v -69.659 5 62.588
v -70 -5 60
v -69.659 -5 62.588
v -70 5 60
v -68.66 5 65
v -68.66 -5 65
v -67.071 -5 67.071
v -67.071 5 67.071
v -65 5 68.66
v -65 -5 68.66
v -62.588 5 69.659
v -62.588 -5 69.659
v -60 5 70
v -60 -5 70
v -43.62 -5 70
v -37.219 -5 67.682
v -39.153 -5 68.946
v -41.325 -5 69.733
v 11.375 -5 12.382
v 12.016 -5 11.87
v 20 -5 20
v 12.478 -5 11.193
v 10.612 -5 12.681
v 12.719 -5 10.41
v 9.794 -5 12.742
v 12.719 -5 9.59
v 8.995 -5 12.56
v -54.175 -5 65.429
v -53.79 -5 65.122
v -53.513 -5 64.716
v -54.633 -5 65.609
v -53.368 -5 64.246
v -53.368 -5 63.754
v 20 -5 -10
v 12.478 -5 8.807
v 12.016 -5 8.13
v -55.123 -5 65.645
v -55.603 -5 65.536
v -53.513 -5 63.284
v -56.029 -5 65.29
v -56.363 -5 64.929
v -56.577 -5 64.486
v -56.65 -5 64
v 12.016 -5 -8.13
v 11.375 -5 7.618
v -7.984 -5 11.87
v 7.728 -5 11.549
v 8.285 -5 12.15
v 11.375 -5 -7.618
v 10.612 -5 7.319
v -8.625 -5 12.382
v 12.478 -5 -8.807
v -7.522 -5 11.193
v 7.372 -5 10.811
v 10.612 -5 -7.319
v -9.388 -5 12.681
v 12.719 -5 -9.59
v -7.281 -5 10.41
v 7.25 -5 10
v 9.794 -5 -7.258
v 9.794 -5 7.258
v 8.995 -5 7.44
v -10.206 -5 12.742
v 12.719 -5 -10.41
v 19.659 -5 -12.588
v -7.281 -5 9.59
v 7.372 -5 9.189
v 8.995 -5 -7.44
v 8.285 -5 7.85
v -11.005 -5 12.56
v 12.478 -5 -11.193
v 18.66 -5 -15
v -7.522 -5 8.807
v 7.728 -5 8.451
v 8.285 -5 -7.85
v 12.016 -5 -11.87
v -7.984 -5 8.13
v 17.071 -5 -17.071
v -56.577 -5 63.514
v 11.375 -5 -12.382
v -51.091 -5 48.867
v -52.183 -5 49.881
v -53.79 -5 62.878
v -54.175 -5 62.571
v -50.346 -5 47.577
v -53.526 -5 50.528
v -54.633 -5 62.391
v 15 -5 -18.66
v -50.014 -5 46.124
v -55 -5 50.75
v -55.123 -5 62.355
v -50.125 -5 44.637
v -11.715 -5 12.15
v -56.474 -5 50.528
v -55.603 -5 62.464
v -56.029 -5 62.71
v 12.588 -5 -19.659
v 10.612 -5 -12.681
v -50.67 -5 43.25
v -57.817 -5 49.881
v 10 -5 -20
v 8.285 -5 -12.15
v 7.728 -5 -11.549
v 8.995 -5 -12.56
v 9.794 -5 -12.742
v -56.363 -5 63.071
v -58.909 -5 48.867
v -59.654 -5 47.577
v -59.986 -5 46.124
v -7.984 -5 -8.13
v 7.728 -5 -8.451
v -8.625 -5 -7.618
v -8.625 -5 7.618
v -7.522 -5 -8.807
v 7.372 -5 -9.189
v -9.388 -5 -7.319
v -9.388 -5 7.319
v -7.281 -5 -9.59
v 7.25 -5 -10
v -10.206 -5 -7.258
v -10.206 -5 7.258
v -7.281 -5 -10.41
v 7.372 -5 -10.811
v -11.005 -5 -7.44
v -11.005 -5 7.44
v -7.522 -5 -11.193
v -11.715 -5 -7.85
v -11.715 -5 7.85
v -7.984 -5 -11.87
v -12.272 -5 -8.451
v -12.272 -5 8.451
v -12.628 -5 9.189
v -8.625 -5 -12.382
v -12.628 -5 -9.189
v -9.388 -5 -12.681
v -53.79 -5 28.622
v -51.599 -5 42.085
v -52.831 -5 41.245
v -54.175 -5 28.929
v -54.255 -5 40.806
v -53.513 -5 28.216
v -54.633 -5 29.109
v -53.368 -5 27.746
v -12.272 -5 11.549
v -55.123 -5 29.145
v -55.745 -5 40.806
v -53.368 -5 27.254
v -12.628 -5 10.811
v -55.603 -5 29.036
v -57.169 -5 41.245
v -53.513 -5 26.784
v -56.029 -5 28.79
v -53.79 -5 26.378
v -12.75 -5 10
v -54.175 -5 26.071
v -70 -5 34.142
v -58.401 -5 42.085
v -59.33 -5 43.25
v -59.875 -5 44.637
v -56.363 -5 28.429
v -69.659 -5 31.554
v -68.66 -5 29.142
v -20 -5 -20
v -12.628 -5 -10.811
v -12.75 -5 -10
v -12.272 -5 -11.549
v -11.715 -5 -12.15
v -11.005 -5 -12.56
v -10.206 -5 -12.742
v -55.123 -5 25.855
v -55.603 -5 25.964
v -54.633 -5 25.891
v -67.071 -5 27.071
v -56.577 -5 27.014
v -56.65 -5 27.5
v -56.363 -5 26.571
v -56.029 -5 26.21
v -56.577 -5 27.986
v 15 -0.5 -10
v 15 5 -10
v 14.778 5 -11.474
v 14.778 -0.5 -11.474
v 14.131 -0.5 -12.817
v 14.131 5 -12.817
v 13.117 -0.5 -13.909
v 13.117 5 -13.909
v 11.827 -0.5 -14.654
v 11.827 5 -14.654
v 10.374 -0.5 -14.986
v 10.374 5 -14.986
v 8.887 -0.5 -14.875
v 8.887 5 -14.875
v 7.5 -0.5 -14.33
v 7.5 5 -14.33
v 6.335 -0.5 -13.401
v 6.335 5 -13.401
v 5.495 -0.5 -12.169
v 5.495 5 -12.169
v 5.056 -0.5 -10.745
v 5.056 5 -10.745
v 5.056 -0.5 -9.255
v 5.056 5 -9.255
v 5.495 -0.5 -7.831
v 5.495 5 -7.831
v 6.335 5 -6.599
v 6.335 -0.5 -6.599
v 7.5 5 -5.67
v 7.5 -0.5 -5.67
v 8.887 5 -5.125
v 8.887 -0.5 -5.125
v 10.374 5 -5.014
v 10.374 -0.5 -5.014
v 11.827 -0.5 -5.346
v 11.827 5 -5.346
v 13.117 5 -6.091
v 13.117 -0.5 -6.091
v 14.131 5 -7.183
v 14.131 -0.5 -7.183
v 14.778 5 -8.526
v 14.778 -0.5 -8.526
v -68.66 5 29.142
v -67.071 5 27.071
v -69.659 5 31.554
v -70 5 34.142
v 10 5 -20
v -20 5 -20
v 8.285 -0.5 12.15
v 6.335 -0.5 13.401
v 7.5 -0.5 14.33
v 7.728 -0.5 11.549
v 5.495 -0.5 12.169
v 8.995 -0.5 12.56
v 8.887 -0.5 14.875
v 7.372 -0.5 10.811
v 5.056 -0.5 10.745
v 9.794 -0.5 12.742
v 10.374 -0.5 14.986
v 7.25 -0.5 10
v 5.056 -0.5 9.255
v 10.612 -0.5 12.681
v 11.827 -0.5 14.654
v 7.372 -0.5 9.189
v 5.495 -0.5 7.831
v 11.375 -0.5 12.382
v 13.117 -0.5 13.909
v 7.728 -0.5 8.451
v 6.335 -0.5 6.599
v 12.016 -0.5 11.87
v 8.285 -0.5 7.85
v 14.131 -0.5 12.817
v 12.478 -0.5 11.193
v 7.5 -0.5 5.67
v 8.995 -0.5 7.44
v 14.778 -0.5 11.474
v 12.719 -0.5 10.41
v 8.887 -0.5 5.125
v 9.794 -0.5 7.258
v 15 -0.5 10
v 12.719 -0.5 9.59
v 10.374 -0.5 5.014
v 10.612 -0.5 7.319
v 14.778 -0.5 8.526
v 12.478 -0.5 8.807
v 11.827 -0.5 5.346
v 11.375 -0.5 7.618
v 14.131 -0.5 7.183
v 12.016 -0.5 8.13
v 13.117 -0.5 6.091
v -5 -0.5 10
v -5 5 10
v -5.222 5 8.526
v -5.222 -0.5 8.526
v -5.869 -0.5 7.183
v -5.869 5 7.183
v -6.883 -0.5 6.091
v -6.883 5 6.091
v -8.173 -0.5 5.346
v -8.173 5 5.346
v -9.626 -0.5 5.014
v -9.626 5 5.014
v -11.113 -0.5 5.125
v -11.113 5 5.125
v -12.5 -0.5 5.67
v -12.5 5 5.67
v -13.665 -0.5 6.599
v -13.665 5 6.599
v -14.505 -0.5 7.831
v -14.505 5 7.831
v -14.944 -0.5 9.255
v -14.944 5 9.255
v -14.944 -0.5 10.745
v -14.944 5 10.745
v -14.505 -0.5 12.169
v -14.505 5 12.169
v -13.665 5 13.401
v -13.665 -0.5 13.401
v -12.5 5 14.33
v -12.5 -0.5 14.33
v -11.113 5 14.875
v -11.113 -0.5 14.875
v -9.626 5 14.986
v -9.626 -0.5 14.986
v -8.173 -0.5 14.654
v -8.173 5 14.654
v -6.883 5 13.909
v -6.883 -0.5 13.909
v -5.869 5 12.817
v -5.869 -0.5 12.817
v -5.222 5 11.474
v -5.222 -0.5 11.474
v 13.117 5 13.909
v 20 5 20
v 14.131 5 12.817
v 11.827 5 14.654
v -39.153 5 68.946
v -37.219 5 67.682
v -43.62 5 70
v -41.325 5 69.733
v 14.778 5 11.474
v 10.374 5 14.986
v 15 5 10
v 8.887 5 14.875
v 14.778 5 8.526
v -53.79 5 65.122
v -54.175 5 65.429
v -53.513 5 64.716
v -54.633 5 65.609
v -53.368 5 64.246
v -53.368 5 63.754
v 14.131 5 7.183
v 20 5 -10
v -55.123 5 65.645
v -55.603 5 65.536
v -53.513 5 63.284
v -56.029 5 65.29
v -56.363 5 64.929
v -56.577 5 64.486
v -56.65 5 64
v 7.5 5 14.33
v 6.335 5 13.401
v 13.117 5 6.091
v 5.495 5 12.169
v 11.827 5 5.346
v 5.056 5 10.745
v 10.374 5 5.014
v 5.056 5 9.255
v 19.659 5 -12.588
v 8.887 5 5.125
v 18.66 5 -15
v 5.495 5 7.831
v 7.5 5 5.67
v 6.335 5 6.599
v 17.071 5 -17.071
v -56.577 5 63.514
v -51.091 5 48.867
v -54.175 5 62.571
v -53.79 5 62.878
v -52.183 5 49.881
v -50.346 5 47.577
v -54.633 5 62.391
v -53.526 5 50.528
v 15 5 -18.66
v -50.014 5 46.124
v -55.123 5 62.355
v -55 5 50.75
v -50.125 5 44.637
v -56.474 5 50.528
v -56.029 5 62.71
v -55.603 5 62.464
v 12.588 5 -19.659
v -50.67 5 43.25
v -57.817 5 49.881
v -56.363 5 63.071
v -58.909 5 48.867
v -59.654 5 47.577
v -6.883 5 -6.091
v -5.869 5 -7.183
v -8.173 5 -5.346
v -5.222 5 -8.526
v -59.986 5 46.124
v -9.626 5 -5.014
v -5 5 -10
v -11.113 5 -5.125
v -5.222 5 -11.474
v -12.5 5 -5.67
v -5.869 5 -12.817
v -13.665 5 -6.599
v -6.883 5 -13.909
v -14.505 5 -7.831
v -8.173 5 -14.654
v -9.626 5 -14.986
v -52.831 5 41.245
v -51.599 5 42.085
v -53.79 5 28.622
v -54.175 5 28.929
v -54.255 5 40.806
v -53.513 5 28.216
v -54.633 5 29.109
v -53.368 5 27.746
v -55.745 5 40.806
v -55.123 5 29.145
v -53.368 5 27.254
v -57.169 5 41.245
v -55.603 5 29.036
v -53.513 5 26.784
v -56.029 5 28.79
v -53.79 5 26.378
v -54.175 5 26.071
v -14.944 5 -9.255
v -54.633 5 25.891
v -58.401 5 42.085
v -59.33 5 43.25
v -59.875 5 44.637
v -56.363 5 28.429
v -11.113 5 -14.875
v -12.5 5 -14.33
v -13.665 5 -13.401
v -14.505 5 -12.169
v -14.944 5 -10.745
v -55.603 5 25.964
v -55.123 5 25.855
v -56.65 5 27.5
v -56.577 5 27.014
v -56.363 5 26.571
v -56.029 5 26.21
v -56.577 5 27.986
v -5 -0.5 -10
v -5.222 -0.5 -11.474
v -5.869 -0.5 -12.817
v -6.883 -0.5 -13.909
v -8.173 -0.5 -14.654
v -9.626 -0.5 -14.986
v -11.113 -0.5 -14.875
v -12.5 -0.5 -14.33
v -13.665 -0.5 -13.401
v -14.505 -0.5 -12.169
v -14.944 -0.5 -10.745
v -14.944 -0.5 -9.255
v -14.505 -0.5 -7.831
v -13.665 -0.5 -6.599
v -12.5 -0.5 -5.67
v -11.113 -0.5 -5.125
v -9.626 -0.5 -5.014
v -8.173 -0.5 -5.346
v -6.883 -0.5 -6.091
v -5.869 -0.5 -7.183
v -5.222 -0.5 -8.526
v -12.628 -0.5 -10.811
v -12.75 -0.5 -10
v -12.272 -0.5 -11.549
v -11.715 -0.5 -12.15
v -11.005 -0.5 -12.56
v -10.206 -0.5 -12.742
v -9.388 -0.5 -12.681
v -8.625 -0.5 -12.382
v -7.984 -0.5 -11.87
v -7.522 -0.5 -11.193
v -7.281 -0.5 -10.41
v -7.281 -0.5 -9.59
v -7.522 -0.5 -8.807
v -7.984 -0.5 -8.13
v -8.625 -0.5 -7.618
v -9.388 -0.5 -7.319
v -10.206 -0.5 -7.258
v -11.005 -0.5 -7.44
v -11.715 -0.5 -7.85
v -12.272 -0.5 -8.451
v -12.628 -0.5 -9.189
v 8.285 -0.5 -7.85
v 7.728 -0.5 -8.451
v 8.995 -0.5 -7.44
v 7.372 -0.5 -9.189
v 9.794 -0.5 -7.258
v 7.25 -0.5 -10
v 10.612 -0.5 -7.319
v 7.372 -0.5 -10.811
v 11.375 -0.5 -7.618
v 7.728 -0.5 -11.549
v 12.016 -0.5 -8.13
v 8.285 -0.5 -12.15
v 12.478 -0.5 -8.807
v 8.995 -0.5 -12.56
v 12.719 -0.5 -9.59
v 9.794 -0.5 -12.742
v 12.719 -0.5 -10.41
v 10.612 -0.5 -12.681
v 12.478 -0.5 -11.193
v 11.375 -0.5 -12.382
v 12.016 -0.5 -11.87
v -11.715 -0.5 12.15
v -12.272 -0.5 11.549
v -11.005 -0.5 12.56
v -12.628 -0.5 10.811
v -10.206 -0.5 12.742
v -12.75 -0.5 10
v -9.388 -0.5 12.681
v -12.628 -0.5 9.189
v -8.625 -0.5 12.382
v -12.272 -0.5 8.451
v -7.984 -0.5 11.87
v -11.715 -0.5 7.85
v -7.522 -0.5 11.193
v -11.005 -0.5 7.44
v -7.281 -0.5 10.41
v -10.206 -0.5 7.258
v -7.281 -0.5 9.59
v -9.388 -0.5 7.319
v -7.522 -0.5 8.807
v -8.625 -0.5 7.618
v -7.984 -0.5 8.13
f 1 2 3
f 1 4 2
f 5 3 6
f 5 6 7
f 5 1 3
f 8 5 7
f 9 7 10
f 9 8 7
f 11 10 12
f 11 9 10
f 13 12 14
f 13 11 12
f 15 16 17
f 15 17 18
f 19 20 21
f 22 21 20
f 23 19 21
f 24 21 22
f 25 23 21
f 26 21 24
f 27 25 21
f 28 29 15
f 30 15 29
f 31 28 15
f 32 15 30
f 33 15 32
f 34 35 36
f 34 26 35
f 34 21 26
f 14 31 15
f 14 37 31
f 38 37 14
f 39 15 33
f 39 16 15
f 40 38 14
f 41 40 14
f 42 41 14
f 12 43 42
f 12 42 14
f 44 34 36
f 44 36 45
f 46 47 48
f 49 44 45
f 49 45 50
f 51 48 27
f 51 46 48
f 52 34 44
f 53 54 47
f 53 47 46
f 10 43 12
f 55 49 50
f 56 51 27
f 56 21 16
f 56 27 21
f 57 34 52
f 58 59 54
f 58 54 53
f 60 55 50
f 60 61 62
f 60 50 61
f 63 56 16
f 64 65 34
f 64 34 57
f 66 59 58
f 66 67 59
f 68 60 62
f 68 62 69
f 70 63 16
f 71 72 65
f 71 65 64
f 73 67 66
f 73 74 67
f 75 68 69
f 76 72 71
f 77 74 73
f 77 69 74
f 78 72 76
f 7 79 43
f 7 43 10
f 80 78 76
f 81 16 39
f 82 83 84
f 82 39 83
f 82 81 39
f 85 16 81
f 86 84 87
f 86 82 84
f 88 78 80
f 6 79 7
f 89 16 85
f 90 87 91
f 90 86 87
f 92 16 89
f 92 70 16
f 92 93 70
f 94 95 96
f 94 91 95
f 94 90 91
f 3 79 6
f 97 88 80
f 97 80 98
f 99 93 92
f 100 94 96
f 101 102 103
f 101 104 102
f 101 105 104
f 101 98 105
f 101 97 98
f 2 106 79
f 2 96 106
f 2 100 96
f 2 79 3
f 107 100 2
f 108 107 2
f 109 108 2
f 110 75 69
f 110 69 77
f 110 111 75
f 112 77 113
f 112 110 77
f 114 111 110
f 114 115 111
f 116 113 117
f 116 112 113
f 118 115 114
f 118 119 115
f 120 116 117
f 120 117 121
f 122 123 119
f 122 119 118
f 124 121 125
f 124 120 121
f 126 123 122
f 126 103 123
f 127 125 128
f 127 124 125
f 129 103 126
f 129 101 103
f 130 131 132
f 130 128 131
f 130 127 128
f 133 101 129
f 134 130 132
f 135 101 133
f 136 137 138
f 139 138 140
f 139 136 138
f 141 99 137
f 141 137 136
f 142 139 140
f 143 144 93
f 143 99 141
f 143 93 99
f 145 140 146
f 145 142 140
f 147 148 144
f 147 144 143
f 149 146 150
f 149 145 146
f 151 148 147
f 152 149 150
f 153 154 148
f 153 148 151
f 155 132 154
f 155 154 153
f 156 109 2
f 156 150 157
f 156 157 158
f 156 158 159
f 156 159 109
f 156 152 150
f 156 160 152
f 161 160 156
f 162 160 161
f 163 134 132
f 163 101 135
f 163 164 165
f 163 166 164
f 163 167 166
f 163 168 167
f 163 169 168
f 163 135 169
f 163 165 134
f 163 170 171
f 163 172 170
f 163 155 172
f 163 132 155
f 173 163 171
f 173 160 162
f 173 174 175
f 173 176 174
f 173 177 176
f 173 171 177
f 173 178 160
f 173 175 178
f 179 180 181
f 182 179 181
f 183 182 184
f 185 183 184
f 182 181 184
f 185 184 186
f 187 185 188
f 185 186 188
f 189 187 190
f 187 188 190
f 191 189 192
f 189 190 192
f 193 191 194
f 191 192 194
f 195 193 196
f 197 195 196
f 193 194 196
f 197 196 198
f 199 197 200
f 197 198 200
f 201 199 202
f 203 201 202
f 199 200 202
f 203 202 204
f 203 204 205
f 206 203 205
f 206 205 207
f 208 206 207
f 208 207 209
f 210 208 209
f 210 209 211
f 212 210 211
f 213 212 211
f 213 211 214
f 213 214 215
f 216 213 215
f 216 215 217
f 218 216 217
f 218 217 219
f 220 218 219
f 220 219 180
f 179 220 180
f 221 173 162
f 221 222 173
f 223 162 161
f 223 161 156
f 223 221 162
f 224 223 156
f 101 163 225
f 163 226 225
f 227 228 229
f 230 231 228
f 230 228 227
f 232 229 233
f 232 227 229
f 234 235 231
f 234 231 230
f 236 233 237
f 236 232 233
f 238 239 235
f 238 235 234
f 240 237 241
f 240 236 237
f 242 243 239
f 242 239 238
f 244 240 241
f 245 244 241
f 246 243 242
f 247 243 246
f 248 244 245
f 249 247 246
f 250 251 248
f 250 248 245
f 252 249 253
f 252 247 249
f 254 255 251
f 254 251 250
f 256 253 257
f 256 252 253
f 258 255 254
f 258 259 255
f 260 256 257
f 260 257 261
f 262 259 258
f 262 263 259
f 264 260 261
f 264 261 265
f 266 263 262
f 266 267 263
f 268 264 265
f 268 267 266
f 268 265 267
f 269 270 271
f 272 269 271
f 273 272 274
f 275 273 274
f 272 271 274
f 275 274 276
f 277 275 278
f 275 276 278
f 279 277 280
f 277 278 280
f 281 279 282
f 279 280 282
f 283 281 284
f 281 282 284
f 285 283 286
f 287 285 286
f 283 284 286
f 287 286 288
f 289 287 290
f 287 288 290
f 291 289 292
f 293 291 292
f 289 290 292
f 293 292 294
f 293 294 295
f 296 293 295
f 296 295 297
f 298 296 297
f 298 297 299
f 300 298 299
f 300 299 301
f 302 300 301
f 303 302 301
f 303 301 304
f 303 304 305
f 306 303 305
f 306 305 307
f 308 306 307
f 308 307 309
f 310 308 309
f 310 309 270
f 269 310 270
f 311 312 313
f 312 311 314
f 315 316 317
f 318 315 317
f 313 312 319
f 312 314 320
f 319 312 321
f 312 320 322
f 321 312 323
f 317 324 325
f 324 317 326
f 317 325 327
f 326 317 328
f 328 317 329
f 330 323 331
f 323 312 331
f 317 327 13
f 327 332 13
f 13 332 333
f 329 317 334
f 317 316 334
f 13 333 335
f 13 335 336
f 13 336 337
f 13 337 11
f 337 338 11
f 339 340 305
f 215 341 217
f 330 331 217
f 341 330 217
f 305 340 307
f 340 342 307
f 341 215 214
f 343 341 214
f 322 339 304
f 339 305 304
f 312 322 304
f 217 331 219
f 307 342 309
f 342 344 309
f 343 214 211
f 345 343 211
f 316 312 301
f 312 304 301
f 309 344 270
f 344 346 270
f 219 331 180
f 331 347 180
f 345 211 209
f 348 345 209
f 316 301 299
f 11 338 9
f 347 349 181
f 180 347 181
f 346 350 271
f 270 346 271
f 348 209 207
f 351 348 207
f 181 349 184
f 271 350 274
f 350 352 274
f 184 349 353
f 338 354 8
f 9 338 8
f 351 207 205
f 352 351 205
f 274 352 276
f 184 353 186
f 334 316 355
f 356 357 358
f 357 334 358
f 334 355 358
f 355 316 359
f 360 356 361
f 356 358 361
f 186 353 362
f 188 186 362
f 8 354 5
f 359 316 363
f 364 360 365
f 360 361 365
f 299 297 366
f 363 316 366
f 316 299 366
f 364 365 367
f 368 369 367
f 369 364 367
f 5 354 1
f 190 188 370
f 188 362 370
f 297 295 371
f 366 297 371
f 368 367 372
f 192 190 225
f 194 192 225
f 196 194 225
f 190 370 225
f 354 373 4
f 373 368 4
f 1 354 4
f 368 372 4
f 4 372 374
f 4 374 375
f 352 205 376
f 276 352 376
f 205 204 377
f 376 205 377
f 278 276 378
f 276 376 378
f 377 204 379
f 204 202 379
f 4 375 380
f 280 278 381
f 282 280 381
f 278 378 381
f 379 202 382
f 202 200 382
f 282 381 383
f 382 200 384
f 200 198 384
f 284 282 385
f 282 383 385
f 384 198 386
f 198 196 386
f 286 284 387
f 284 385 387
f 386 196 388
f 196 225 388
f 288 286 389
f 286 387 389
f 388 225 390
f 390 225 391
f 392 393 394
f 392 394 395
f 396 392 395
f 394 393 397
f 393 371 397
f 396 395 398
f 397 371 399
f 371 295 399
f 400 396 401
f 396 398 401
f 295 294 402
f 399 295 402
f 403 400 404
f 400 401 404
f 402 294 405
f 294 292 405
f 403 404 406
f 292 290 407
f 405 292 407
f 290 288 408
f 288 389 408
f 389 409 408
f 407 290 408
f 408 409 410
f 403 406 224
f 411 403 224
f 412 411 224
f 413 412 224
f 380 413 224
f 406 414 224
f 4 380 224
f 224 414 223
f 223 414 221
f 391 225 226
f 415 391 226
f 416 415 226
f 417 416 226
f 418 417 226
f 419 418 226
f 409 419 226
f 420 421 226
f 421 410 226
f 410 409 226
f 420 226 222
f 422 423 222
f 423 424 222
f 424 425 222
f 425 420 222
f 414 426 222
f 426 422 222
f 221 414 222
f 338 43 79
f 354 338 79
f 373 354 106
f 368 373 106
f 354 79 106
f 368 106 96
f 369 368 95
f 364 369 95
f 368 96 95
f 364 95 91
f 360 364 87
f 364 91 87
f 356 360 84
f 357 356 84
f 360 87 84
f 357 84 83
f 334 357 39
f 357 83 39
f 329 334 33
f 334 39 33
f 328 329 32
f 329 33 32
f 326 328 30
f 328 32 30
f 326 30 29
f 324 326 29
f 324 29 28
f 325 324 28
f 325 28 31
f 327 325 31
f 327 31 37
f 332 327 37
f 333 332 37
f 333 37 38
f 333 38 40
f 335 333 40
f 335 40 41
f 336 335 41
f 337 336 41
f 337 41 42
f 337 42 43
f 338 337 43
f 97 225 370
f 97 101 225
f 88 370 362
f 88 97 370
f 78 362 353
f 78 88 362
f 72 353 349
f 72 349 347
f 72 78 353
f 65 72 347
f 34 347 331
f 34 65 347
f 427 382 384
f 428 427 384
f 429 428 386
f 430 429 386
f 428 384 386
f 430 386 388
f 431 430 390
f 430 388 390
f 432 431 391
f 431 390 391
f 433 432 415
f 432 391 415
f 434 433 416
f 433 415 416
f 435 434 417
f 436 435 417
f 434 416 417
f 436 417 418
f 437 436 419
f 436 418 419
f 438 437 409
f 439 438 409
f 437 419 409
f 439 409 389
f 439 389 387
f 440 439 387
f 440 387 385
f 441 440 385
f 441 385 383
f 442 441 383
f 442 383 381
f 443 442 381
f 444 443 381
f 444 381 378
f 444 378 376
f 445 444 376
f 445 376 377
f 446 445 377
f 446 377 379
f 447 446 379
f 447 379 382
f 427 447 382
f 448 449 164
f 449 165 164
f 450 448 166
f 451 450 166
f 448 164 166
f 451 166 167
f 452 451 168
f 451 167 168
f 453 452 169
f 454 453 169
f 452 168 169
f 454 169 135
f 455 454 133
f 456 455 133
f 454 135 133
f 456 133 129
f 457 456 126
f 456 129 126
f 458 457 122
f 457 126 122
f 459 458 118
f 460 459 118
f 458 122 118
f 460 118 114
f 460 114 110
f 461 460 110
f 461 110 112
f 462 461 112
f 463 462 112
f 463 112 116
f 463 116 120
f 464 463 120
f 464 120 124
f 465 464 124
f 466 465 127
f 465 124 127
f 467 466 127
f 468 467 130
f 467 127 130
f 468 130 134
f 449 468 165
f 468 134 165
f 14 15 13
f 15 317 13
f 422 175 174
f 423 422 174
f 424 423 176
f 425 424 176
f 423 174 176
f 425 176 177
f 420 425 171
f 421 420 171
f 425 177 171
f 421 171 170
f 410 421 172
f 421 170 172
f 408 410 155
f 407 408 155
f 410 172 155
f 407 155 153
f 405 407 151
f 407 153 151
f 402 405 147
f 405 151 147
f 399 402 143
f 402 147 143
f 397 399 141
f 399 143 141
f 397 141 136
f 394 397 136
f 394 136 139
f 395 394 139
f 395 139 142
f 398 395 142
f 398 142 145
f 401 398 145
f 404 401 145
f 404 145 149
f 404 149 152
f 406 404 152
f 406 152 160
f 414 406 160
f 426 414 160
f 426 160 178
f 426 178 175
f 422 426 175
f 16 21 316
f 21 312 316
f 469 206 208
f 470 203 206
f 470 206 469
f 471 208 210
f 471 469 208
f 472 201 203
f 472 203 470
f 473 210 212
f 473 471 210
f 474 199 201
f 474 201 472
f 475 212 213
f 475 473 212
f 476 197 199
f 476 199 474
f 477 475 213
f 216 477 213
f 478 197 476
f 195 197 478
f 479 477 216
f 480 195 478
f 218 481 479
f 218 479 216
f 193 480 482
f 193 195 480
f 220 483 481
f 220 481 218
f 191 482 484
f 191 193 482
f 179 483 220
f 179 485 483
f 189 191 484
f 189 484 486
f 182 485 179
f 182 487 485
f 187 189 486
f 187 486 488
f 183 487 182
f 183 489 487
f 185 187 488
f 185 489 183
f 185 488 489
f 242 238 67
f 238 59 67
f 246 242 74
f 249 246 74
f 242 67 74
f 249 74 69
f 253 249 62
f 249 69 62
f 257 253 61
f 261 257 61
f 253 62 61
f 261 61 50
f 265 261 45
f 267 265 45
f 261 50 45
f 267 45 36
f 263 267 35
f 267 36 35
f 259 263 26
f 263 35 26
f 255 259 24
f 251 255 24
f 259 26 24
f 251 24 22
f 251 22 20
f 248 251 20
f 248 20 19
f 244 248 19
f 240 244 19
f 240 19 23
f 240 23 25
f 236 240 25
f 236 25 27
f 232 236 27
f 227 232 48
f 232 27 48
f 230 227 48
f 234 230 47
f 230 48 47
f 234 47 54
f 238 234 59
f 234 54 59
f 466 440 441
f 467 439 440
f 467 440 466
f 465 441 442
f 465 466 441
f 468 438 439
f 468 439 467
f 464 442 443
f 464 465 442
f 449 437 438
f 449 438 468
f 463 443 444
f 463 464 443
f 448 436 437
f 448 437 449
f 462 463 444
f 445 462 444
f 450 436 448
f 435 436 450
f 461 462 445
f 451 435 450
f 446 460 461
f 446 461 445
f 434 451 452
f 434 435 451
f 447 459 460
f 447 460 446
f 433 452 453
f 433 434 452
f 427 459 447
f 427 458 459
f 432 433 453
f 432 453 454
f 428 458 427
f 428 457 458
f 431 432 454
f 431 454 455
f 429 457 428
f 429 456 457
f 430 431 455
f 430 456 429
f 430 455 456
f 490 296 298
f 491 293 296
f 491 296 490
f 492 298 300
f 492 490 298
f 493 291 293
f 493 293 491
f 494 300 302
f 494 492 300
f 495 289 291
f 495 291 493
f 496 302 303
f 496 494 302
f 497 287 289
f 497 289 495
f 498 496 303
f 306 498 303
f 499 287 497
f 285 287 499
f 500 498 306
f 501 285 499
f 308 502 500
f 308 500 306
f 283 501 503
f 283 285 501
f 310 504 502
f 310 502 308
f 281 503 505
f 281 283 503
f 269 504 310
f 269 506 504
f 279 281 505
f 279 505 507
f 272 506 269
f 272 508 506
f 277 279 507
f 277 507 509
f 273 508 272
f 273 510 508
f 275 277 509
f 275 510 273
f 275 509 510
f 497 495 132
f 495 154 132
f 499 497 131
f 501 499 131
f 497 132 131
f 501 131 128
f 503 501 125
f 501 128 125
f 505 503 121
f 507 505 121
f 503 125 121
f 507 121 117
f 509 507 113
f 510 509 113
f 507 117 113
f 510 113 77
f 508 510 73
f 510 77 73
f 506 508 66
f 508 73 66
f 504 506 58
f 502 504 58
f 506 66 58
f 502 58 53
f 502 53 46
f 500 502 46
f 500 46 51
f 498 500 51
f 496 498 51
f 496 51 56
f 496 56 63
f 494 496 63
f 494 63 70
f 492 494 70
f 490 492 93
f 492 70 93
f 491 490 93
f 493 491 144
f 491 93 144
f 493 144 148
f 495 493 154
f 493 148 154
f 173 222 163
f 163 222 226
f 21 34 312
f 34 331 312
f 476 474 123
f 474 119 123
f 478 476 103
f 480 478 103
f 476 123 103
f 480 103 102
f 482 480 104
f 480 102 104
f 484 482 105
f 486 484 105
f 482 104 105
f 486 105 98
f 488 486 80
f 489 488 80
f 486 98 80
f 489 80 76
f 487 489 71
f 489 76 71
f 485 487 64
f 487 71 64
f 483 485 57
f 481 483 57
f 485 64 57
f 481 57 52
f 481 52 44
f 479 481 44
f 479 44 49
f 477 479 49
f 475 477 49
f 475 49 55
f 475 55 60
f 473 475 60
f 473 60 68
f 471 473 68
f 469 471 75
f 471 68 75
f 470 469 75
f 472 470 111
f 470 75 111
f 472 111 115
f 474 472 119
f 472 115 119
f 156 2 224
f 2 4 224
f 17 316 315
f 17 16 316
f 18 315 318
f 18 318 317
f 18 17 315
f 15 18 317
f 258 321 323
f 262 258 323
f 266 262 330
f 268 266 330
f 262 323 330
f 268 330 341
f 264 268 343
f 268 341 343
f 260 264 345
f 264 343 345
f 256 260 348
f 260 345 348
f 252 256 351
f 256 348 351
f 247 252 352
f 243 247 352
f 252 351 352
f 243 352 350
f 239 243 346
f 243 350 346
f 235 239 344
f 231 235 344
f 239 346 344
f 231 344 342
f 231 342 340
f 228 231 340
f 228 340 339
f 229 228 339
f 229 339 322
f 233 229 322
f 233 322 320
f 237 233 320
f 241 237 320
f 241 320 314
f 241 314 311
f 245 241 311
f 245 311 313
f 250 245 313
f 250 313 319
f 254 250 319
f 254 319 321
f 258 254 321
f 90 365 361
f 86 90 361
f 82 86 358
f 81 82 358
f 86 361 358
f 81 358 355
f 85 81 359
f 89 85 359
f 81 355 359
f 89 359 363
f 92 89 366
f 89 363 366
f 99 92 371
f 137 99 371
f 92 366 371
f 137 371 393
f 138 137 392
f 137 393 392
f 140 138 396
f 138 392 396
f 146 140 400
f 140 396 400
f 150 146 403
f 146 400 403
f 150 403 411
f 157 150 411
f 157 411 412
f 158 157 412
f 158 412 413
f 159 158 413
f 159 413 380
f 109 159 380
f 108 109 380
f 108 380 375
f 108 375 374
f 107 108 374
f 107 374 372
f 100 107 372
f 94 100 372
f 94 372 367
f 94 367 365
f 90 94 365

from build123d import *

# Parameters (mm, degrees)
BOSS_EXTRUDE1_DEPTH                                 = 5
CBORE_FOR_M5_HEX_SOCKET_HEAD_CAP_SCREW2_D           = 5.5
CBORE_FOR_M5_HEX_SOCKET_HEAD_CAP_SCREW2_CBORE_D     = 10
CBORE_FOR_M5_HEX_SOCKET_HEAD_CAP_SCREW2_CBORE_DEPTH = 5.5
M4_TAPPED_HOLE1_D                                   = 3.3
SKETCH8_R                                           = 5
CUT_EXTRUDE3_DEPTH                                  = 100.498743711
FILLET1_R                                           = 10


with BuildPart() as part:
    # Sketch1 → Boss-Extrude1 (new, symmetric)
    with BuildSketch(Plane(origin=(0, 0, 0), x_dir=(1, 0, 0), z_dir=(0, 1, 0))):
        Polygon((-20, 20), (20, 20), (20, -20), (-40, -70), (-70, -70), (-70, -30), align=None)
    extrude(amount=BOSS_EXTRUDE1_DEPTH, both=True)

    # CBORE for M5 Hex Socket Head Cap Screw2 (through all)
    with Locations(Plane(origin=(0, 5, 0), x_dir=(1, 0, 0), z_dir=(0, 1, 0))):
        with Locations((-10, 10), (10, 10), (10, -10), (-10, -10)):
            CounterBoreHole(CBORE_FOR_M5_HEX_SOCKET_HEAD_CAP_SCREW2_D / 2, CBORE_FOR_M5_HEX_SOCKET_HEAD_CAP_SCREW2_CBORE_D / 2, CBORE_FOR_M5_HEX_SOCKET_HEAD_CAP_SCREW2_CBORE_DEPTH)

    # M4 Tapped Hole1 (through all)
    with Locations(Plane(origin=(0, 5, 0), x_dir=(1, 0, 0), z_dir=(0, 1, 0))):
        with Locations((-55, -27.5), (-55, -64)):
            Hole(M4_TAPPED_HOLE1_D / 2)

    # Sketch8 → Cut-Extrude3 (cut, through all)
    with BuildSketch(Plane(origin=(0, 5, 0), x_dir=(1, 0, 0), z_dir=(0, 1, 0))):
        with Locations(Location((-55, -45.75, 0), (0, 0, 270))):
            Circle(SKETCH8_R)
    extrude(amount=-CUT_EXTRUDE3_DEPTH, mode=Mode.SUBTRACT)

    # Fillet1
    fillet1_edges = [part.edges().sort_by_distance(p)[0] for p in [
        (20, 0, -20),
        (-40, 0, 70),
        (-70, 0, 70),
        (-70, 0, 30),
    ]]
    fillet(fillet1_edges, radius=FILLET1_R)


solid = part.part
